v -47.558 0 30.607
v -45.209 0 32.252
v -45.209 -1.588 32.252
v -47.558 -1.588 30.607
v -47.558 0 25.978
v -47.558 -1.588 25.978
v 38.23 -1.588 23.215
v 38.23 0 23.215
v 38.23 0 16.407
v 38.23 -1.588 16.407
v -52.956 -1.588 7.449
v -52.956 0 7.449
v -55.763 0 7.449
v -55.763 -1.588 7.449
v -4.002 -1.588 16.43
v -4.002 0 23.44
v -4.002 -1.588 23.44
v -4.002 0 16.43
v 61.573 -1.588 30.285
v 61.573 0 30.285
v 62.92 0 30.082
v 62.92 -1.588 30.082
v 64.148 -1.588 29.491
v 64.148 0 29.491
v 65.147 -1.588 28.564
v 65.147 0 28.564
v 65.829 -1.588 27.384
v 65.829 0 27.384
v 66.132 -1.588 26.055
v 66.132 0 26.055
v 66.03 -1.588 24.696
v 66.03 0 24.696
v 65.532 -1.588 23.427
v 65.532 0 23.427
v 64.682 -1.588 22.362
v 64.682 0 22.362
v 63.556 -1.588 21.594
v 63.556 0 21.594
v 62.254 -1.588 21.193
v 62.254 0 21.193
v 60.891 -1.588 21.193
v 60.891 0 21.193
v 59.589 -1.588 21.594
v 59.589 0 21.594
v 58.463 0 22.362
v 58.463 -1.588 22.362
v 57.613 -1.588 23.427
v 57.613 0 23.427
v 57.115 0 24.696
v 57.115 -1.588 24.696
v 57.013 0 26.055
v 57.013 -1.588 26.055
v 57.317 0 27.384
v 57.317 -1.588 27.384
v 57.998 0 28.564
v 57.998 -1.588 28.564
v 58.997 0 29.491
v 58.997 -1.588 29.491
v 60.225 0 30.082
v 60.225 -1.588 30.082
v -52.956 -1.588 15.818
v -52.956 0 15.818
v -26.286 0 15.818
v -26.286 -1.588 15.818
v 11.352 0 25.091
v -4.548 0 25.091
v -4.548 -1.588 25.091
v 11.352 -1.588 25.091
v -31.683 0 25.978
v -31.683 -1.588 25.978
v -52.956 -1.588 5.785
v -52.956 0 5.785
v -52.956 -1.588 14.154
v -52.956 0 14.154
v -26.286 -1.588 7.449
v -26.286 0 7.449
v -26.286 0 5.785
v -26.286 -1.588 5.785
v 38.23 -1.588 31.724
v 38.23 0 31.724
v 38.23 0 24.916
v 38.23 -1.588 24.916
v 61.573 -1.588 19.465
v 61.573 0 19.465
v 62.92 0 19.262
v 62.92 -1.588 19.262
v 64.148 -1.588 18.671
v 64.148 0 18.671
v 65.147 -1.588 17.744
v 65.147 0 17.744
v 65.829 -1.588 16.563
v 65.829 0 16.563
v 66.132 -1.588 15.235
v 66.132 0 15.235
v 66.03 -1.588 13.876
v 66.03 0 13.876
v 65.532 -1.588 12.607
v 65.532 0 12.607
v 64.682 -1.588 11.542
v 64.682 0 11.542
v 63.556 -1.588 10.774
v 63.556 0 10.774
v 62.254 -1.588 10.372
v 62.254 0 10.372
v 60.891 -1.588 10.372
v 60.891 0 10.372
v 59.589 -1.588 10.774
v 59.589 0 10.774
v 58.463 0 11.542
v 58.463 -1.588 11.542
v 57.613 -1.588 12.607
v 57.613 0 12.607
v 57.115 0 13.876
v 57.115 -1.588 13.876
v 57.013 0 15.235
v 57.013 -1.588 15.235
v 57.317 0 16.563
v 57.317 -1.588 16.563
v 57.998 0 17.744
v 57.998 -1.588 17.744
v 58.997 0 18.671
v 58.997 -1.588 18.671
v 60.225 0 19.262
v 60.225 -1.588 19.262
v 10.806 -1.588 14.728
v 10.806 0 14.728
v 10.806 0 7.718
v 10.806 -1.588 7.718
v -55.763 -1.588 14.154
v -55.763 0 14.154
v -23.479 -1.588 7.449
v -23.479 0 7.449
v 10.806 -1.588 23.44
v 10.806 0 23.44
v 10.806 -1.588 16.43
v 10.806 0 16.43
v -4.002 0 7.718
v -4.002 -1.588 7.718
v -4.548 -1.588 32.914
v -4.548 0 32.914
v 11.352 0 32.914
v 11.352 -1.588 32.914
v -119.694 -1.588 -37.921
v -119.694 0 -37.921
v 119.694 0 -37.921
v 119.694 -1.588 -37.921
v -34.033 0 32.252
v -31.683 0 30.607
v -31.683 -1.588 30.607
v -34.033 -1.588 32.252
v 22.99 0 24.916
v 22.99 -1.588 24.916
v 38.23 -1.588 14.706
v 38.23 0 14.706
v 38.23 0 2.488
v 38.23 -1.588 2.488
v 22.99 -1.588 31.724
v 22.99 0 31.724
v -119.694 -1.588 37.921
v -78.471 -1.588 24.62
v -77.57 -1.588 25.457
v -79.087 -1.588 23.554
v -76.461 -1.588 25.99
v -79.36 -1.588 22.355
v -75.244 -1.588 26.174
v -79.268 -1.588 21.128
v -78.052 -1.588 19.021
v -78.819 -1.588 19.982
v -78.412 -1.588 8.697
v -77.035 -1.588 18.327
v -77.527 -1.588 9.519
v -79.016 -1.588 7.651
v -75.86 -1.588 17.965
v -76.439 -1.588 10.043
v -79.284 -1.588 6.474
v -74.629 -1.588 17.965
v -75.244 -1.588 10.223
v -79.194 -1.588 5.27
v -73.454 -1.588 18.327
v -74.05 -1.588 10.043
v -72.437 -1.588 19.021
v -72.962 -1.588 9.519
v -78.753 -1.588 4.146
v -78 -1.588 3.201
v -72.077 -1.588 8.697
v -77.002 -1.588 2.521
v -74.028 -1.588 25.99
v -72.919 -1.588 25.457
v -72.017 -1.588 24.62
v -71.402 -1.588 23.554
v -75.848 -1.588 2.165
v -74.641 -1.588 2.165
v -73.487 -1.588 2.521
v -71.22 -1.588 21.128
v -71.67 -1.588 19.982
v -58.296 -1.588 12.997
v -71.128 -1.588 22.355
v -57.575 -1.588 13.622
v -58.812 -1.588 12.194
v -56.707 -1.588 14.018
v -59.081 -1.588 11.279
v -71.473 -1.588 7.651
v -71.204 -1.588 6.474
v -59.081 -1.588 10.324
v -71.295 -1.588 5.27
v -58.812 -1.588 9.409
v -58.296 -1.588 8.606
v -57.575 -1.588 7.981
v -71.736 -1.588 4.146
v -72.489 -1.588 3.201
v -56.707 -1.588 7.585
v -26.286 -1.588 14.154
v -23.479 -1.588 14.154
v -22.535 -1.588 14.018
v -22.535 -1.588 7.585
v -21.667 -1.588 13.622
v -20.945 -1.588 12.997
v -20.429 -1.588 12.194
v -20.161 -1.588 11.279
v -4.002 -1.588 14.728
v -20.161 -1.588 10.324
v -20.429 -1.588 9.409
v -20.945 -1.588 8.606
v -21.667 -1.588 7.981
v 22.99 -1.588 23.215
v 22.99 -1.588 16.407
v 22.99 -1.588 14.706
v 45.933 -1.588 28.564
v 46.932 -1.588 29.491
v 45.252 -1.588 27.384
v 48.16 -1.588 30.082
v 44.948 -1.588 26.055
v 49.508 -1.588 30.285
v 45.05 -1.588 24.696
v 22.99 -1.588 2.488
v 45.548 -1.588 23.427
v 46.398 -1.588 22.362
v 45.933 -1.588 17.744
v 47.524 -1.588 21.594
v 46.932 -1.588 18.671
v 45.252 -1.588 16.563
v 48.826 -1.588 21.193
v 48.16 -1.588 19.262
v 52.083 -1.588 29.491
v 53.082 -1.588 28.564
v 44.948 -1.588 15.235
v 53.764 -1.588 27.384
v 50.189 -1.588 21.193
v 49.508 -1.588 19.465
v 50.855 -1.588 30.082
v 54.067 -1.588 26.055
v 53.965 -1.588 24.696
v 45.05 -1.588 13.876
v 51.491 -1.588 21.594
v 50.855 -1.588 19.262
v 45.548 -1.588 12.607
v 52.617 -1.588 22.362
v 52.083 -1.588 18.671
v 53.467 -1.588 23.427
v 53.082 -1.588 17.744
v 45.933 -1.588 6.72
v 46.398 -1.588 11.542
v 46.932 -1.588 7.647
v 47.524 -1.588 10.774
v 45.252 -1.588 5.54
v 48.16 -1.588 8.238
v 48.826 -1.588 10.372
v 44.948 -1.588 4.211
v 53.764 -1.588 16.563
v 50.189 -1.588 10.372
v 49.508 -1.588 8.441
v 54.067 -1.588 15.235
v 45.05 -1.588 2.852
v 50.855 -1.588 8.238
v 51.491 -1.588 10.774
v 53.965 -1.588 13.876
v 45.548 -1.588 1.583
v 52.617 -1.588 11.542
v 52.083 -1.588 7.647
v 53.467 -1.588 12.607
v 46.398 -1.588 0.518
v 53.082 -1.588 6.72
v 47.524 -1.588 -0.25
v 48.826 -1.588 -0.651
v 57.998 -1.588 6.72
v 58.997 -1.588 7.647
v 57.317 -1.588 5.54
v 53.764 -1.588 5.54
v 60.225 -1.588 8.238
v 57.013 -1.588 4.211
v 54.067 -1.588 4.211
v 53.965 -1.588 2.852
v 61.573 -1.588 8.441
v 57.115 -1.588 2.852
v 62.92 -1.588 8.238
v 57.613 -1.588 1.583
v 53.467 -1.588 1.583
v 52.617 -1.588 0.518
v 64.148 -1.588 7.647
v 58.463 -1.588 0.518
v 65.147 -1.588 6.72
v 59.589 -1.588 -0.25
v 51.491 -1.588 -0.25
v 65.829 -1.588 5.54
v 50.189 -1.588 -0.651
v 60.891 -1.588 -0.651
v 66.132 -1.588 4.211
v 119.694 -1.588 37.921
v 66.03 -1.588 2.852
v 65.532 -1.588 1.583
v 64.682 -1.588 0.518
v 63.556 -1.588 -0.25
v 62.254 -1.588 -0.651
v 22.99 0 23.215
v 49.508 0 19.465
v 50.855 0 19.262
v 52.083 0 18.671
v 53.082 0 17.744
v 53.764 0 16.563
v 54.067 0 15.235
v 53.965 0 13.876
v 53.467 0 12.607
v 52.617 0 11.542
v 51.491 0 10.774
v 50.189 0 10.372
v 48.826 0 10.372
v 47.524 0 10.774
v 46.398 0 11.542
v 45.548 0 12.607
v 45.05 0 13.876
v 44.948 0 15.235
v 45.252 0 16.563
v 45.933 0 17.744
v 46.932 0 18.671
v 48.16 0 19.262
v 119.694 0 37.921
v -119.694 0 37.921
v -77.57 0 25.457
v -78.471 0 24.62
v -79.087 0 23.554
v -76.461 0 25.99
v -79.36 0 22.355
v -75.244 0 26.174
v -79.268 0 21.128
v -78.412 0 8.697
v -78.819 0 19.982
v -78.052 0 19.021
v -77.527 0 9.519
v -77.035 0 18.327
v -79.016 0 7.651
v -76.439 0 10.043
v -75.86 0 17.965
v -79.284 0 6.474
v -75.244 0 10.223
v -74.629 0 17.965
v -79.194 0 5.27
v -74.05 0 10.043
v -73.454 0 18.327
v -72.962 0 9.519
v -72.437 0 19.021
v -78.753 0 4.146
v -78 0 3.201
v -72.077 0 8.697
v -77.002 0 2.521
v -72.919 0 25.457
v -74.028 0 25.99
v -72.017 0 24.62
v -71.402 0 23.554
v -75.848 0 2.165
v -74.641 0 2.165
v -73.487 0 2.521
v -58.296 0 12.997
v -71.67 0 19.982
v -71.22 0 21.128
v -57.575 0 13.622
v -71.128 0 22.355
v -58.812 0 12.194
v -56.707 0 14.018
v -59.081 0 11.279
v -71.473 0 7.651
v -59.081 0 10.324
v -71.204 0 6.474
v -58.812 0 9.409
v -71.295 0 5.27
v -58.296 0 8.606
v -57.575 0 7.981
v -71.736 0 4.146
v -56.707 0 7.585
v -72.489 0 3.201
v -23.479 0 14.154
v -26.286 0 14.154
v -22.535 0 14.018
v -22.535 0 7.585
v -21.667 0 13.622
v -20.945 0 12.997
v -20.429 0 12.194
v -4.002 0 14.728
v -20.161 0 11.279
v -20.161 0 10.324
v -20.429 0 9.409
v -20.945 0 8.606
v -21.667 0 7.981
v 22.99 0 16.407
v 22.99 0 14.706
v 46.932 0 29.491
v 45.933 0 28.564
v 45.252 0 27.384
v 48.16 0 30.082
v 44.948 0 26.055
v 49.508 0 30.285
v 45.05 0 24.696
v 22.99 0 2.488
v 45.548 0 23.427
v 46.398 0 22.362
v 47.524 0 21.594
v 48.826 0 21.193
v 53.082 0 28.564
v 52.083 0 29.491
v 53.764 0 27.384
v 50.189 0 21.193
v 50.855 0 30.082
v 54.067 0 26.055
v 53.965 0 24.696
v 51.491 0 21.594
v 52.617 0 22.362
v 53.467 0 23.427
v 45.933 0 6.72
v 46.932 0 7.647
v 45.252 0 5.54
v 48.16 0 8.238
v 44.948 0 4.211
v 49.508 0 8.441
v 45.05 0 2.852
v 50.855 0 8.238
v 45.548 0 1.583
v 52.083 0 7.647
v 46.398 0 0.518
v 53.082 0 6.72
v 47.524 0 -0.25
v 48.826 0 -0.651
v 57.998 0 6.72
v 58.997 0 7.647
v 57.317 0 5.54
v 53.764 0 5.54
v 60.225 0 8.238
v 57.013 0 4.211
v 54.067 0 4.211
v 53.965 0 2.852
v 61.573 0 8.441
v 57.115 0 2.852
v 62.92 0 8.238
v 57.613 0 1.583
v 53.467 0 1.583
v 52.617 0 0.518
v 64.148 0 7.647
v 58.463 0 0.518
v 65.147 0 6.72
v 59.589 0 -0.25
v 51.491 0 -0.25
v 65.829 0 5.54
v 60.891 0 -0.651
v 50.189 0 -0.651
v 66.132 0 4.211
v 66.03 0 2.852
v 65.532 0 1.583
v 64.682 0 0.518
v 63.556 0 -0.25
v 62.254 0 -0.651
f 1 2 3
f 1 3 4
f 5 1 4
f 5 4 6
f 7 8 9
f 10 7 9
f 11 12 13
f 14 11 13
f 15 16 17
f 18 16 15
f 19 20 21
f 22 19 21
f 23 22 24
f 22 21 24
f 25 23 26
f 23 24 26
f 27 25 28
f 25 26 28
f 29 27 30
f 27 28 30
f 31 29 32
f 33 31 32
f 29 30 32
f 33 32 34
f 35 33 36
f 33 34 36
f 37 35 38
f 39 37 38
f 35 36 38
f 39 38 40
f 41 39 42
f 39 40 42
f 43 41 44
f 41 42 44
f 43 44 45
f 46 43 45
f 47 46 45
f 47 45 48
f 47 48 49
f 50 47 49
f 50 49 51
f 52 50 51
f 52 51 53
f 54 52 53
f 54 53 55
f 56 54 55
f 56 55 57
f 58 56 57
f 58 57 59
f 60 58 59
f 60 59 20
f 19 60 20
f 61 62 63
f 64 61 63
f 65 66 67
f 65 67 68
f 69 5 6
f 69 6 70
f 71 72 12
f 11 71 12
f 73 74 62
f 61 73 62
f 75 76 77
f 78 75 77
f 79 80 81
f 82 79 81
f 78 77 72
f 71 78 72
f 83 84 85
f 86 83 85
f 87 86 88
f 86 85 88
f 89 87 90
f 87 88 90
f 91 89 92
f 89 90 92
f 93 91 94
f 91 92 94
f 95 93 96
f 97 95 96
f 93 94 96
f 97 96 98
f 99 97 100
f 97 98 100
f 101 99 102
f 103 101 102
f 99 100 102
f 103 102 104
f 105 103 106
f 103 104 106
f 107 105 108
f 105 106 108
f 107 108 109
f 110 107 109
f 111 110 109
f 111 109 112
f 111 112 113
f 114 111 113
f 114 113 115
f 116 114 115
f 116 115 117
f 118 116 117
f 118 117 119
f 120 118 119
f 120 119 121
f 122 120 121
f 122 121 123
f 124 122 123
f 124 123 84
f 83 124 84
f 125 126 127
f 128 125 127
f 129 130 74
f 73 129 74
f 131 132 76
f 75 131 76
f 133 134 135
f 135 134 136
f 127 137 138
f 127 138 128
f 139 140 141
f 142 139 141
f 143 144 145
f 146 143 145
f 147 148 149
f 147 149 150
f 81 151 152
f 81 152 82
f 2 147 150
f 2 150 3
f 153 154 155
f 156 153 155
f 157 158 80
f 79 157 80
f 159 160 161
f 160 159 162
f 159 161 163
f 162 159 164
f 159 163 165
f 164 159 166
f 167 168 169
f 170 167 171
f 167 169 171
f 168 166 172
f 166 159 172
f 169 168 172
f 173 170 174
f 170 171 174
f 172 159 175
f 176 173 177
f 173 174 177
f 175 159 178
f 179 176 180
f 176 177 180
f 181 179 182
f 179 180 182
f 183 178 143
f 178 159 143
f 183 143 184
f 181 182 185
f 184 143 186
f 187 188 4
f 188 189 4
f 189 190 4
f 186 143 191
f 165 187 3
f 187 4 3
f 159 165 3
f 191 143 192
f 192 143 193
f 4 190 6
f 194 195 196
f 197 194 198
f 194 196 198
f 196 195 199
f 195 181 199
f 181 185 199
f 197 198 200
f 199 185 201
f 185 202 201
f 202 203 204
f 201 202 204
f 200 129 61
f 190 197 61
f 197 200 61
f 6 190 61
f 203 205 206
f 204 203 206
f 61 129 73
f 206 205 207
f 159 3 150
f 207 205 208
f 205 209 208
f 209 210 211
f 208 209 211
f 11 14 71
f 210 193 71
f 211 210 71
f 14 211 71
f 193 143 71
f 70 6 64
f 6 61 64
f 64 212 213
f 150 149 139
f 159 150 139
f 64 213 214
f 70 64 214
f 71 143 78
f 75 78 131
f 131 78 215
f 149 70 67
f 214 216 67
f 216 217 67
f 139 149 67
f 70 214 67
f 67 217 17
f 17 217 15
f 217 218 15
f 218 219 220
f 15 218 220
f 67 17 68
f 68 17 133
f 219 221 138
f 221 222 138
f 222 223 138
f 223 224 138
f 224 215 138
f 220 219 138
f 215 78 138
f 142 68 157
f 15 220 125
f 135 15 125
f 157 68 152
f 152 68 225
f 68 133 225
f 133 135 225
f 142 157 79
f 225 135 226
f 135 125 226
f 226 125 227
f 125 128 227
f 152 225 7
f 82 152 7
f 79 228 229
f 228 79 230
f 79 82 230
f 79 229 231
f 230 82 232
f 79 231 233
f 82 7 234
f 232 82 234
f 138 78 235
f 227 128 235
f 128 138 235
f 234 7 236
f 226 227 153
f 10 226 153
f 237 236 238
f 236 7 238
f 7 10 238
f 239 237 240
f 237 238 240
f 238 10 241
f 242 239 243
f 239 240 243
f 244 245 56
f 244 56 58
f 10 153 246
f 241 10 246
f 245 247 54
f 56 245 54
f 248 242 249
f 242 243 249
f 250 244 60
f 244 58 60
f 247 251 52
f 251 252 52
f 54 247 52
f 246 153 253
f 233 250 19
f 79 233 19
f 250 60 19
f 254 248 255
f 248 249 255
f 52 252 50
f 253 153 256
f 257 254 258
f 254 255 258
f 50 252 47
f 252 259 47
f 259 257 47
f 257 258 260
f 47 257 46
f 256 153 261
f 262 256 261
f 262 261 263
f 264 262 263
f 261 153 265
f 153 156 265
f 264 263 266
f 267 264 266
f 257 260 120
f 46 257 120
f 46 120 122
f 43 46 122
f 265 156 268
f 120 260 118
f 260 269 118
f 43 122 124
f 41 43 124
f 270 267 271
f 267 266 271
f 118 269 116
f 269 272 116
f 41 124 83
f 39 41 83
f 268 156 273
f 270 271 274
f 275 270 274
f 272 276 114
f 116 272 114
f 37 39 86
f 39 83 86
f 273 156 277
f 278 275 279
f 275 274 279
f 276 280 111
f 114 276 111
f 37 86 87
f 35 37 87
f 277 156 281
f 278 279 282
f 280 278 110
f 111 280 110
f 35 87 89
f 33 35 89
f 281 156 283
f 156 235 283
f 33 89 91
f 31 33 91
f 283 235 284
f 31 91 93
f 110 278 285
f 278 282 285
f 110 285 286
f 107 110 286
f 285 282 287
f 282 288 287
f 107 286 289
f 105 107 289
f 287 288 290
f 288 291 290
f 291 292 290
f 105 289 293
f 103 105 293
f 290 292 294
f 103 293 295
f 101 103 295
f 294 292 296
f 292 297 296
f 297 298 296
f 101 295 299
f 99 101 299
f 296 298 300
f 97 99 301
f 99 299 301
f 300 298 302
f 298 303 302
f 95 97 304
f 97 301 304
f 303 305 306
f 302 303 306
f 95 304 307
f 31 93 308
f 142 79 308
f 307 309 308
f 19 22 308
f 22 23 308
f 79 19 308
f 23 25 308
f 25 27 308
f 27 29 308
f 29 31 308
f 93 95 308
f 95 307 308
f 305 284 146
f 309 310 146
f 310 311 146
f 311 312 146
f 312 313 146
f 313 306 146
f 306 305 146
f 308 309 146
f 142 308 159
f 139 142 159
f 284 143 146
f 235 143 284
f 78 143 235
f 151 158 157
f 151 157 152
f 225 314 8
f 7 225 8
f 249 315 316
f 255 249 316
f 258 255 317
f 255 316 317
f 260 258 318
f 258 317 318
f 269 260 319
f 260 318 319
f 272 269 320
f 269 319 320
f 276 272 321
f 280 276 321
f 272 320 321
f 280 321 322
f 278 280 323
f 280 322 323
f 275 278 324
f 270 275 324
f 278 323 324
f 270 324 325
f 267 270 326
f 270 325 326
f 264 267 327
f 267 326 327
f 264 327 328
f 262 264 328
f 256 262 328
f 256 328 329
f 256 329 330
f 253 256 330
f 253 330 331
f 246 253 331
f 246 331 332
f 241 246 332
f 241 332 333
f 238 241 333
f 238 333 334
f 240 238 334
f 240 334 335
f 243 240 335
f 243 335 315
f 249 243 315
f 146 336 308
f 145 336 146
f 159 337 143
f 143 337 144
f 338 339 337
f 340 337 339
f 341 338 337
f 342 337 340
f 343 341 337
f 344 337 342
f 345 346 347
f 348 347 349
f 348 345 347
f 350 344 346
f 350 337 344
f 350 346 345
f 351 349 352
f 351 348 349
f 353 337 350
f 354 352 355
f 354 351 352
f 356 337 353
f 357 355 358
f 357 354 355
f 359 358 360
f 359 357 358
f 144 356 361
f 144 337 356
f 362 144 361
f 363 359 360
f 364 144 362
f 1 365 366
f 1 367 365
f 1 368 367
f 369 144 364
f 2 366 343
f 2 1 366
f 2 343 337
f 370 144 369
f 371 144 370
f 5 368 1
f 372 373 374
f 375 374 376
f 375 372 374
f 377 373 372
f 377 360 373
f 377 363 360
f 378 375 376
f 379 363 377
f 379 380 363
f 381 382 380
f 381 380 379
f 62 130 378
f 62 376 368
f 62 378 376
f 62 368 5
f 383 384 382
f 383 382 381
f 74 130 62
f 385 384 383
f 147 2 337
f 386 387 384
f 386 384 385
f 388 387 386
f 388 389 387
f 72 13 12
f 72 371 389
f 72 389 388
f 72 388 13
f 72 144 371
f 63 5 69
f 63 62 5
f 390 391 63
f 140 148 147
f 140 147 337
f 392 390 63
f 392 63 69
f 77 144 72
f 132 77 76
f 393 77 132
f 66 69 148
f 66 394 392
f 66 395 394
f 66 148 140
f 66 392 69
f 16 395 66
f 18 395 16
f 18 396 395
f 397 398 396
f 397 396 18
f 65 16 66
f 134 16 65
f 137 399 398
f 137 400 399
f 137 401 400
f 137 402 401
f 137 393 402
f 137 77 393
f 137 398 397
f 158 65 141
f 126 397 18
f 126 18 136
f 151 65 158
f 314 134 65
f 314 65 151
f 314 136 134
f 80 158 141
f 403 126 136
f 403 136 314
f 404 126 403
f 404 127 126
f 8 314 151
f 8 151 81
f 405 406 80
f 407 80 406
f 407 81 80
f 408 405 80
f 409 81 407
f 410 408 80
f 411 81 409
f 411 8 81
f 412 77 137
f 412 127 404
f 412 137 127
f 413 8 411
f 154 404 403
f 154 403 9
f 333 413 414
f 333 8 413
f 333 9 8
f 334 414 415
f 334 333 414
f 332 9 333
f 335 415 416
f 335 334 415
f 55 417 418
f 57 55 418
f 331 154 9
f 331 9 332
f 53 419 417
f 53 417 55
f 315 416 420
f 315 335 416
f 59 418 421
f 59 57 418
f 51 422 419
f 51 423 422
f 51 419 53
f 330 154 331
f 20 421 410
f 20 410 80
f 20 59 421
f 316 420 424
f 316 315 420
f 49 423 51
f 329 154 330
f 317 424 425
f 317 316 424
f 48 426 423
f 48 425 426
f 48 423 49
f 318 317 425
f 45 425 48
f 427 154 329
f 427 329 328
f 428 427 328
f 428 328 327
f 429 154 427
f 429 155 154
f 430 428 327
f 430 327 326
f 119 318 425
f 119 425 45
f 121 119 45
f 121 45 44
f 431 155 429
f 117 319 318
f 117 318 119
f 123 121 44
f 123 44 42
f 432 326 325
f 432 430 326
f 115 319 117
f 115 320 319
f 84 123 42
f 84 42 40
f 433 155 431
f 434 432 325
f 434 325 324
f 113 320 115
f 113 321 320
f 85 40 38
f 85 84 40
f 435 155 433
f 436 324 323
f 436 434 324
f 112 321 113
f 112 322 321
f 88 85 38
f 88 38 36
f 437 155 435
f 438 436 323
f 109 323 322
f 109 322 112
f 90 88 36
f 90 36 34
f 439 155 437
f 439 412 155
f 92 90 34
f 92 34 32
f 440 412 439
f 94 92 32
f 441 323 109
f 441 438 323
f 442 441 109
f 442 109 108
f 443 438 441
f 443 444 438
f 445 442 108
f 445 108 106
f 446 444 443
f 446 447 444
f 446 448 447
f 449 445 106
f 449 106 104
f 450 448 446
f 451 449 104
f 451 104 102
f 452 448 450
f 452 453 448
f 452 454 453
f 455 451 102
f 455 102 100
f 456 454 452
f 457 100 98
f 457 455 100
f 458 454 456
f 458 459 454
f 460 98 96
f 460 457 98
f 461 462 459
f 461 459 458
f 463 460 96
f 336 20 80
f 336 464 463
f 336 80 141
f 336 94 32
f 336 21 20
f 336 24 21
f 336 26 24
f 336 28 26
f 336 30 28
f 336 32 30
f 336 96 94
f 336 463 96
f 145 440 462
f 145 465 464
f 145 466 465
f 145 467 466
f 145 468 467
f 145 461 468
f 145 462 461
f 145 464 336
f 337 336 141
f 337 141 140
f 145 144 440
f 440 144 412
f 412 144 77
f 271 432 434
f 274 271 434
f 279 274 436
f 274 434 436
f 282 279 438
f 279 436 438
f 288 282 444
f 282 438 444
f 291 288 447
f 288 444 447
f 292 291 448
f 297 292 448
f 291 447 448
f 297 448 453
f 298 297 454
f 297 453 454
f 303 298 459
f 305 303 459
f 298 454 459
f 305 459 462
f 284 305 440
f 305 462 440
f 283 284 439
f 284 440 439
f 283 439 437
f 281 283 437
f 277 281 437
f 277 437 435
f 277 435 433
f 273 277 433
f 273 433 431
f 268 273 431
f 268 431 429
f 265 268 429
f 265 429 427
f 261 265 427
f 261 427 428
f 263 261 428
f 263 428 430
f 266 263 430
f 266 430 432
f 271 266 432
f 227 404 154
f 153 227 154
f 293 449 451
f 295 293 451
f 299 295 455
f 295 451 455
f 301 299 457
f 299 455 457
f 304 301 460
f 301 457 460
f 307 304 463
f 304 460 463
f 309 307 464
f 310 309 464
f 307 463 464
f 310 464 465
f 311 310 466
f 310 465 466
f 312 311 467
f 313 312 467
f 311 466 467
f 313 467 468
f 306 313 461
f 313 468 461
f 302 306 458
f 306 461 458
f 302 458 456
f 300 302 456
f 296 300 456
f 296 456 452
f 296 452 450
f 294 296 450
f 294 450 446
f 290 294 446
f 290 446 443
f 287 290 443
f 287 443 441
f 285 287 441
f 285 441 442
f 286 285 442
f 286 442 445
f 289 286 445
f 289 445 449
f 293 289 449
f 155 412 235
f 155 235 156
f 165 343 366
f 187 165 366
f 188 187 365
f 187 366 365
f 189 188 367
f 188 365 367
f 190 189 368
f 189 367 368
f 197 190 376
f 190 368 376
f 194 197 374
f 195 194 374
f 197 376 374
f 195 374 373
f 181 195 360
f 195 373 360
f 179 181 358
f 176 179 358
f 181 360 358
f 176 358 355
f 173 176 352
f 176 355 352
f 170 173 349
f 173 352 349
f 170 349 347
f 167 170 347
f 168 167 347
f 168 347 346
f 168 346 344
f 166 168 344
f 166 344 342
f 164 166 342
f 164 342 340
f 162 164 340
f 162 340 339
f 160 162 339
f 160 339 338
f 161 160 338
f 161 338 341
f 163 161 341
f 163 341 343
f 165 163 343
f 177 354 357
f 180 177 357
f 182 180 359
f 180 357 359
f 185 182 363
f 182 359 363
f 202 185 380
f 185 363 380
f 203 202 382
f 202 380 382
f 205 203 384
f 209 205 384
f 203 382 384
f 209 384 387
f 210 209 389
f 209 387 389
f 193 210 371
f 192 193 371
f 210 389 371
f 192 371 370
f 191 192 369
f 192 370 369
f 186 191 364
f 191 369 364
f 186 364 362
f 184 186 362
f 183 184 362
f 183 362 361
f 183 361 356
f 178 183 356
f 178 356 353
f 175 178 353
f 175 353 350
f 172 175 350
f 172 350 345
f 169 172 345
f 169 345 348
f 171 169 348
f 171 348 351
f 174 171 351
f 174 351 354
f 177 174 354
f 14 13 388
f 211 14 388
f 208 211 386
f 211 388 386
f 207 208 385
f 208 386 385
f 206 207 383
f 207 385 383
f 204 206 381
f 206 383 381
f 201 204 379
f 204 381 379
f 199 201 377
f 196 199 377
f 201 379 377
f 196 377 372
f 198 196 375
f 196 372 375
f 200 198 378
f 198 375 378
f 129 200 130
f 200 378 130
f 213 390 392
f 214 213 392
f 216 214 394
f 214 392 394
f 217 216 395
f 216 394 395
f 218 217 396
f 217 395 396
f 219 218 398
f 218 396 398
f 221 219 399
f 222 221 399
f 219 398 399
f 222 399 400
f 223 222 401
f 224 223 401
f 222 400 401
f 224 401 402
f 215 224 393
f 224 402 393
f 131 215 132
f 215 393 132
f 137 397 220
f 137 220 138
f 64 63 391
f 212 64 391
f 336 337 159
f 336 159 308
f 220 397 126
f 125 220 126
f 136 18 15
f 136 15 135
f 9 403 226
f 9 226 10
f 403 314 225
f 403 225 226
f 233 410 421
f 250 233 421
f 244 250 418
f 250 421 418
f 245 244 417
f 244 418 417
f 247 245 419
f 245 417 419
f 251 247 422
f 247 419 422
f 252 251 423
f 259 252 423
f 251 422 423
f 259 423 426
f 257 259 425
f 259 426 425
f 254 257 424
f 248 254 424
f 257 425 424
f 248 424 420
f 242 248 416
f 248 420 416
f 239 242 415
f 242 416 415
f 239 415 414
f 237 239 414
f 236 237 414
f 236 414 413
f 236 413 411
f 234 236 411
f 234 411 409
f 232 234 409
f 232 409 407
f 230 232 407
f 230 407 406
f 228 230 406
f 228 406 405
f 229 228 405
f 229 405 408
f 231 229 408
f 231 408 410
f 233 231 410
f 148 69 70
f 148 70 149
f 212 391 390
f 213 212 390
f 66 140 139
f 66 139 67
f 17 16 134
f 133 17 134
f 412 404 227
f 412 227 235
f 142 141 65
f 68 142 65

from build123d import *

# Parameters (mm, degrees)
SKETCH1_W           = 239.388843642
SKETCH1_H           = 75.842411424
BOSS_EXTRUDE1_DEPTH = 1.5875
CUT_EXTRUDE1_REACH  = 127.568
SKETCH2_R           = 4.1275
SKETCH2_R_2         = 4.572
SKETCH2_R_3         = 4.0513
SKETCH2_W           = 14.8082
SKETCH2_H           = 7.0104
SKETCH2_W_2         = 15.9004
SKETCH2_H_2         = 7.8232
SKETCH2_W_3         = 15.24
SKETCH2_H_3         = 12.2174
SKETCH2_H_4         = 6.8072


with BuildPart() as part:
    # Sketch1 → Boss-Extrude1 (new body)
    with BuildSketch(Plane(origin=(0, 0, 0), x_dir=(1, 0, 0), z_dir=(0, 1, 0))):
        Rectangle(SKETCH1_W, SKETCH1_H)
    extrude(amount=-BOSS_EXTRUDE1_DEPTH)

    # Sketch2 → Cut-Extrude1 (cut, up to next)
    with BuildSketch(Plane(origin=(0, 0, 0), x_dir=(1, 0, 0), z_dir=(0, 1, 0)), mode=Mode.PRIVATE) as cut_extrude1_sk1:
        with Locations(Location((-75.244421821, -22.046205712, 0), (0, 0, 270))):
            Circle(SKETCH2_R)
    cut_extrude1_tool1 = extrude(cut_extrude1_sk1.sketch, amount=-CUT_EXTRUDE1_REACH, mode=Mode.PRIVATE) & part.part
    # Sketch2 → Cut-Extrude1 (cut, up to next)
    with BuildSketch(Plane(origin=(0, 0, 0), x_dir=(1, 0, 0), z_dir=(0, 1, 0)), mode=Mode.PRIVATE) as cut_extrude1_sk2:
        with Locations(Location((49.507678179, -25.713445712, 0), (0, 0, 270))):
            Circle(SKETCH2_R_2)
    cut_extrude1_tool2 = extrude(cut_extrude1_sk2.sketch, amount=-CUT_EXTRUDE1_REACH, mode=Mode.PRIVATE) & part.part
    # Sketch2 → Cut-Extrude1 (cut, up to next)
    with BuildSketch(Plane(origin=(0, 0, 0), x_dir=(1, 0, 0), z_dir=(0, 1, 0)), mode=Mode.PRIVATE) as cut_extrude1_sk3:
        with Locations(Location((-75.244421821, -6.171205712, 0), (0, 0, 270))):
            Circle(SKETCH2_R_3)
    cut_extrude1_tool3 = extrude(cut_extrude1_sk3.sketch, amount=-CUT_EXTRUDE1_REACH, mode=Mode.PRIVATE) & part.part
    # Sketch2 → Cut-Extrude1 (cut, up to next)
    with BuildSketch(Plane(origin=(0, 0, 0), x_dir=(1, 0, 0), z_dir=(0, 1, 0)), mode=Mode.PRIVATE) as cut_extrude1_sk4:
        with Locations(Location((49.507678179, -3.869445712, 0), (0, 0, 270))):
            Circle(SKETCH2_R_2)
    cut_extrude1_tool4 = extrude(cut_extrude1_sk4.sketch, amount=-CUT_EXTRUDE1_REACH, mode=Mode.PRIVATE) & part.part
    # Sketch2 → Cut-Extrude1 (cut, up to next)
    with BuildSketch(Plane(origin=(0, 0, 0), x_dir=(1, 0, 0), z_dir=(0, 1, 0)), mode=Mode.PRIVATE) as cut_extrude1_sk5:
        with Locations(Location((61.572678179, -3.869445712, 0), (0, 0, 270))):
            Circle(SKETCH2_R_2)
    cut_extrude1_tool5 = extrude(cut_extrude1_sk5.sketch, amount=-CUT_EXTRUDE1_REACH, mode=Mode.PRIVATE) & part.part
    # Sketch2 → Cut-Extrude1 (cut, up to next)
    with BuildSketch(Plane(origin=(0, 0, 0), x_dir=(1, 0, 0), z_dir=(0, 1, 0)), mode=Mode.PRIVATE) as cut_extrude1_sk6:
        with Locations(Location((49.507678179, -14.893045712, 0), (0, 0, 270))):
            Circle(SKETCH2_R_2)
    cut_extrude1_tool6 = extrude(cut_extrude1_sk6.sketch, amount=-CUT_EXTRUDE1_REACH, mode=Mode.PRIVATE) & part.part
    # Sketch2 → Cut-Extrude1 (cut, up to next)
    with BuildSketch(Plane(origin=(0, 0, 0), x_dir=(1, 0, 0), z_dir=(0, 1, 0)), mode=Mode.PRIVATE) as cut_extrude1_sk7:
        with Locations(Location((61.572678179, -14.893045712, 0), (0, 0, 270))):
            Circle(SKETCH2_R_2)
    cut_extrude1_tool7 = extrude(cut_extrude1_sk7.sketch, amount=-CUT_EXTRUDE1_REACH, mode=Mode.PRIVATE) & part.part
    # Sketch2 → Cut-Extrude1 (cut, up to next)
    with BuildSketch(Plane(origin=(0, 0, 0), x_dir=(1, 0, 0), z_dir=(0, 1, 0)), mode=Mode.PRIVATE) as cut_extrude1_sk8:
        with Locations(Location((61.572678179, -25.713445712, 0), (0, 0, 270))):
            Circle(SKETCH2_R_2)
    cut_extrude1_tool8 = extrude(cut_extrude1_sk8.sketch, amount=-CUT_EXTRUDE1_REACH, mode=Mode.PRIVATE) & part.part
    # Sketch2 → Cut-Extrude1 (cut, up to next)
    with BuildSketch(Plane(origin=(0, 0, 0), x_dir=(1, 0, 0), z_dir=(0, 1, 0)), mode=Mode.PRIVATE) as cut_extrude1_sk9:
        Polygon((-47.558421821, -25.977996251), (-31.683421821, -25.977996251), (-31.683421821, -30.60665864), (-34.032921821, -32.251796251), (-45.208921821, -32.251796251), (-47.558421821, -30.60665864), align=None)
    cut_extrude1_tool9 = extrude(cut_extrude1_sk9.sketch, amount=-CUT_EXTRUDE1_REACH, mode=Mode.PRIVATE) & part.part
    # Sketch2 → Cut-Extrude1 (cut, up to next)
    with BuildSketch(Plane(origin=(0, 0, 0), x_dir=(1, 0, 0), z_dir=(0, 1, 0)), mode=Mode.PRIVATE) as cut_extrude1_sk10:
        with BuildLine():
            Line((-52.955921821, -14.154296251), (-52.955921821, -15.817996251))
            Line((-52.955921821, -15.817996251), (-26.285921821, -15.817996251))
            Line((-26.285921821, -15.817996251), (-26.285921821, -14.154296251))
            Line((-26.285921821, -14.154296251), (-23.479221821, -14.154296251))
            ThreePointArc((-23.479221821, -14.154296251), (-20.126421821, -10.801496251), (-23.479221821, -7.448696251))
            Line((-23.479221821, -7.448696251), (-26.285921821, -7.448696251))
            Line((-26.285921821, -7.448696251), (-26.285921821, -5.784996251))
            Line((-26.285921821, -5.784996251), (-52.955921821, -5.784996251))
            Line((-52.955921821, -5.784996251), (-52.955921821, -7.448696251))
            Line((-52.955921821, -7.448696251), (-55.762621821, -7.448696251))
            ThreePointArc((-55.762621821, -7.448696251), (-59.115421821, -10.801496251), (-55.762621821, -14.154296251))
            Line((-55.762621821, -14.154296251), (-52.955921821, -14.154296251))
        make_face()
    cut_extrude1_tool10 = extrude(cut_extrude1_sk10.sketch, amount=-CUT_EXTRUDE1_REACH, mode=Mode.PRIVATE) & part.part
    # Sketch2 → Cut-Extrude1 (cut, up to next)
    with BuildSketch(Plane(origin=(0, 0, 0), x_dir=(1, 0, 0), z_dir=(0, 1, 0)), mode=Mode.PRIVATE) as cut_extrude1_sk11:
        with Locations((3.401875226, -11.222745712)):
            Rectangle(SKETCH2_W, SKETCH2_H)
    cut_extrude1_tool11 = extrude(cut_extrude1_sk11.sketch, amount=-CUT_EXTRUDE1_REACH, mode=Mode.PRIVATE) & part.part
    # Sketch2 → Cut-Extrude1 (cut, up to next)
    with BuildSketch(Plane(origin=(0, 0, 0), x_dir=(1, 0, 0), z_dir=(0, 1, 0)), mode=Mode.PRIVATE) as cut_extrude1_sk12:
        with Locations((3.401875226, -19.934945712)):
            Rectangle(SKETCH2_W, SKETCH2_H)
    cut_extrude1_tool12 = extrude(cut_extrude1_sk12.sketch, amount=-CUT_EXTRUDE1_REACH, mode=Mode.PRIVATE) & part.part
    # Sketch2 → Cut-Extrude1 (cut, up to next)
    with BuildSketch(Plane(origin=(0, 0, 0), x_dir=(1, 0, 0), z_dir=(0, 1, 0)), mode=Mode.PRIVATE) as cut_extrude1_sk13:
        with Locations((3.401875226, -29.002745712)):
            Rectangle(SKETCH2_W_2, SKETCH2_H_2)
    cut_extrude1_tool13 = extrude(cut_extrude1_sk13.sketch, amount=-CUT_EXTRUDE1_REACH, mode=Mode.PRIVATE) & part.part
    # Sketch2 → Cut-Extrude1 (cut, up to next)
    with BuildSketch(Plane(origin=(0, 0, 0), x_dir=(1, 0, 0), z_dir=(0, 1, 0)), mode=Mode.PRIVATE) as cut_extrude1_sk14:
        with Locations((30.610078179, -8.596905712)):
            Rectangle(SKETCH2_W_3, SKETCH2_H_3)
    cut_extrude1_tool14 = extrude(cut_extrude1_sk14.sketch, amount=-CUT_EXTRUDE1_REACH, mode=Mode.PRIVATE) & part.part
    # Sketch2 → Cut-Extrude1 (cut, up to next)
    with BuildSketch(Plane(origin=(0, 0, 0), x_dir=(1, 0, 0), z_dir=(0, 1, 0)), mode=Mode.PRIVATE) as cut_extrude1_sk15:
        with Locations((30.610078179, -19.811005712)):
            Rectangle(SKETCH2_W_3, SKETCH2_H_4)
    cut_extrude1_tool15 = extrude(cut_extrude1_sk15.sketch, amount=-CUT_EXTRUDE1_REACH, mode=Mode.PRIVATE) & part.part
    # Sketch2 → Cut-Extrude1 (cut, up to next)
    with BuildSketch(Plane(origin=(0, 0, 0), x_dir=(1, 0, 0), z_dir=(0, 1, 0)), mode=Mode.PRIVATE) as cut_extrude1_sk16:
        with Locations((30.610078179, -28.320005712)):
            Rectangle(SKETCH2_W_3, SKETCH2_H_4)
    cut_extrude1_tool16 = extrude(cut_extrude1_sk16.sketch, amount=-CUT_EXTRUDE1_REACH, mode=Mode.PRIVATE) & part.part
    add(cut_extrude1_tool1.solids().sort_by_distance((-75.244422, 0, 22.046206))[0], mode=Mode.SUBTRACT)
    add(cut_extrude1_tool2.solids().sort_by_distance((49.507678, 0, 25.713446))[0], mode=Mode.SUBTRACT)
    add(cut_extrude1_tool3.solids().sort_by_distance((-75.244422, 0, 6.171206))[0], mode=Mode.SUBTRACT)
    add(cut_extrude1_tool4.solids().sort_by_distance((49.507678, 0, 3.869446))[0], mode=Mode.SUBTRACT)
    add(cut_extrude1_tool5.solids().sort_by_distance((61.572678, 0, 3.869446))[0], mode=Mode.SUBTRACT)
    add(cut_extrude1_tool6.solids().sort_by_distance((49.507678, 0, 14.893046))[0], mode=Mode.SUBTRACT)
    add(cut_extrude1_tool7.solids().sort_by_distance((61.572678, 0, 14.893046))[0], mode=Mode.SUBTRACT)
    add(cut_extrude1_tool8.solids().sort_by_distance((61.572678, 0, 25.713446))[0], mode=Mode.SUBTRACT)
    add(cut_extrude1_tool9.solids().sort_by_distance((-39.620922, 0, 29.010382))[0], mode=Mode.SUBTRACT)
    add(cut_extrude1_tool10.solids().sort_by_distance((-39.620922, 0, 10.801496))[0], mode=Mode.SUBTRACT)
    add(cut_extrude1_tool11.solids().sort_by_distance((3.401875, 0, 11.222746))[0], mode=Mode.SUBTRACT)
    add(cut_extrude1_tool12.solids().sort_by_distance((3.401875, 0, 19.934946))[0], mode=Mode.SUBTRACT)
    add(cut_extrude1_tool13.solids().sort_by_distance((3.401875, 0, 29.002746))[0], mode=Mode.SUBTRACT)
    add(cut_extrude1_tool14.solids().sort_by_distance((30.610078, 0, 8.596906))[0], mode=Mode.SUBTRACT)
    add(cut_extrude1_tool15.solids().sort_by_distance((30.610078, 0, 19.811006))[0], mode=Mode.SUBTRACT)
    add(cut_extrude1_tool16.solids().sort_by_distance((30.610078, 0, 28.320006))[0], mode=Mode.SUBTRACT)


solid = part.part
